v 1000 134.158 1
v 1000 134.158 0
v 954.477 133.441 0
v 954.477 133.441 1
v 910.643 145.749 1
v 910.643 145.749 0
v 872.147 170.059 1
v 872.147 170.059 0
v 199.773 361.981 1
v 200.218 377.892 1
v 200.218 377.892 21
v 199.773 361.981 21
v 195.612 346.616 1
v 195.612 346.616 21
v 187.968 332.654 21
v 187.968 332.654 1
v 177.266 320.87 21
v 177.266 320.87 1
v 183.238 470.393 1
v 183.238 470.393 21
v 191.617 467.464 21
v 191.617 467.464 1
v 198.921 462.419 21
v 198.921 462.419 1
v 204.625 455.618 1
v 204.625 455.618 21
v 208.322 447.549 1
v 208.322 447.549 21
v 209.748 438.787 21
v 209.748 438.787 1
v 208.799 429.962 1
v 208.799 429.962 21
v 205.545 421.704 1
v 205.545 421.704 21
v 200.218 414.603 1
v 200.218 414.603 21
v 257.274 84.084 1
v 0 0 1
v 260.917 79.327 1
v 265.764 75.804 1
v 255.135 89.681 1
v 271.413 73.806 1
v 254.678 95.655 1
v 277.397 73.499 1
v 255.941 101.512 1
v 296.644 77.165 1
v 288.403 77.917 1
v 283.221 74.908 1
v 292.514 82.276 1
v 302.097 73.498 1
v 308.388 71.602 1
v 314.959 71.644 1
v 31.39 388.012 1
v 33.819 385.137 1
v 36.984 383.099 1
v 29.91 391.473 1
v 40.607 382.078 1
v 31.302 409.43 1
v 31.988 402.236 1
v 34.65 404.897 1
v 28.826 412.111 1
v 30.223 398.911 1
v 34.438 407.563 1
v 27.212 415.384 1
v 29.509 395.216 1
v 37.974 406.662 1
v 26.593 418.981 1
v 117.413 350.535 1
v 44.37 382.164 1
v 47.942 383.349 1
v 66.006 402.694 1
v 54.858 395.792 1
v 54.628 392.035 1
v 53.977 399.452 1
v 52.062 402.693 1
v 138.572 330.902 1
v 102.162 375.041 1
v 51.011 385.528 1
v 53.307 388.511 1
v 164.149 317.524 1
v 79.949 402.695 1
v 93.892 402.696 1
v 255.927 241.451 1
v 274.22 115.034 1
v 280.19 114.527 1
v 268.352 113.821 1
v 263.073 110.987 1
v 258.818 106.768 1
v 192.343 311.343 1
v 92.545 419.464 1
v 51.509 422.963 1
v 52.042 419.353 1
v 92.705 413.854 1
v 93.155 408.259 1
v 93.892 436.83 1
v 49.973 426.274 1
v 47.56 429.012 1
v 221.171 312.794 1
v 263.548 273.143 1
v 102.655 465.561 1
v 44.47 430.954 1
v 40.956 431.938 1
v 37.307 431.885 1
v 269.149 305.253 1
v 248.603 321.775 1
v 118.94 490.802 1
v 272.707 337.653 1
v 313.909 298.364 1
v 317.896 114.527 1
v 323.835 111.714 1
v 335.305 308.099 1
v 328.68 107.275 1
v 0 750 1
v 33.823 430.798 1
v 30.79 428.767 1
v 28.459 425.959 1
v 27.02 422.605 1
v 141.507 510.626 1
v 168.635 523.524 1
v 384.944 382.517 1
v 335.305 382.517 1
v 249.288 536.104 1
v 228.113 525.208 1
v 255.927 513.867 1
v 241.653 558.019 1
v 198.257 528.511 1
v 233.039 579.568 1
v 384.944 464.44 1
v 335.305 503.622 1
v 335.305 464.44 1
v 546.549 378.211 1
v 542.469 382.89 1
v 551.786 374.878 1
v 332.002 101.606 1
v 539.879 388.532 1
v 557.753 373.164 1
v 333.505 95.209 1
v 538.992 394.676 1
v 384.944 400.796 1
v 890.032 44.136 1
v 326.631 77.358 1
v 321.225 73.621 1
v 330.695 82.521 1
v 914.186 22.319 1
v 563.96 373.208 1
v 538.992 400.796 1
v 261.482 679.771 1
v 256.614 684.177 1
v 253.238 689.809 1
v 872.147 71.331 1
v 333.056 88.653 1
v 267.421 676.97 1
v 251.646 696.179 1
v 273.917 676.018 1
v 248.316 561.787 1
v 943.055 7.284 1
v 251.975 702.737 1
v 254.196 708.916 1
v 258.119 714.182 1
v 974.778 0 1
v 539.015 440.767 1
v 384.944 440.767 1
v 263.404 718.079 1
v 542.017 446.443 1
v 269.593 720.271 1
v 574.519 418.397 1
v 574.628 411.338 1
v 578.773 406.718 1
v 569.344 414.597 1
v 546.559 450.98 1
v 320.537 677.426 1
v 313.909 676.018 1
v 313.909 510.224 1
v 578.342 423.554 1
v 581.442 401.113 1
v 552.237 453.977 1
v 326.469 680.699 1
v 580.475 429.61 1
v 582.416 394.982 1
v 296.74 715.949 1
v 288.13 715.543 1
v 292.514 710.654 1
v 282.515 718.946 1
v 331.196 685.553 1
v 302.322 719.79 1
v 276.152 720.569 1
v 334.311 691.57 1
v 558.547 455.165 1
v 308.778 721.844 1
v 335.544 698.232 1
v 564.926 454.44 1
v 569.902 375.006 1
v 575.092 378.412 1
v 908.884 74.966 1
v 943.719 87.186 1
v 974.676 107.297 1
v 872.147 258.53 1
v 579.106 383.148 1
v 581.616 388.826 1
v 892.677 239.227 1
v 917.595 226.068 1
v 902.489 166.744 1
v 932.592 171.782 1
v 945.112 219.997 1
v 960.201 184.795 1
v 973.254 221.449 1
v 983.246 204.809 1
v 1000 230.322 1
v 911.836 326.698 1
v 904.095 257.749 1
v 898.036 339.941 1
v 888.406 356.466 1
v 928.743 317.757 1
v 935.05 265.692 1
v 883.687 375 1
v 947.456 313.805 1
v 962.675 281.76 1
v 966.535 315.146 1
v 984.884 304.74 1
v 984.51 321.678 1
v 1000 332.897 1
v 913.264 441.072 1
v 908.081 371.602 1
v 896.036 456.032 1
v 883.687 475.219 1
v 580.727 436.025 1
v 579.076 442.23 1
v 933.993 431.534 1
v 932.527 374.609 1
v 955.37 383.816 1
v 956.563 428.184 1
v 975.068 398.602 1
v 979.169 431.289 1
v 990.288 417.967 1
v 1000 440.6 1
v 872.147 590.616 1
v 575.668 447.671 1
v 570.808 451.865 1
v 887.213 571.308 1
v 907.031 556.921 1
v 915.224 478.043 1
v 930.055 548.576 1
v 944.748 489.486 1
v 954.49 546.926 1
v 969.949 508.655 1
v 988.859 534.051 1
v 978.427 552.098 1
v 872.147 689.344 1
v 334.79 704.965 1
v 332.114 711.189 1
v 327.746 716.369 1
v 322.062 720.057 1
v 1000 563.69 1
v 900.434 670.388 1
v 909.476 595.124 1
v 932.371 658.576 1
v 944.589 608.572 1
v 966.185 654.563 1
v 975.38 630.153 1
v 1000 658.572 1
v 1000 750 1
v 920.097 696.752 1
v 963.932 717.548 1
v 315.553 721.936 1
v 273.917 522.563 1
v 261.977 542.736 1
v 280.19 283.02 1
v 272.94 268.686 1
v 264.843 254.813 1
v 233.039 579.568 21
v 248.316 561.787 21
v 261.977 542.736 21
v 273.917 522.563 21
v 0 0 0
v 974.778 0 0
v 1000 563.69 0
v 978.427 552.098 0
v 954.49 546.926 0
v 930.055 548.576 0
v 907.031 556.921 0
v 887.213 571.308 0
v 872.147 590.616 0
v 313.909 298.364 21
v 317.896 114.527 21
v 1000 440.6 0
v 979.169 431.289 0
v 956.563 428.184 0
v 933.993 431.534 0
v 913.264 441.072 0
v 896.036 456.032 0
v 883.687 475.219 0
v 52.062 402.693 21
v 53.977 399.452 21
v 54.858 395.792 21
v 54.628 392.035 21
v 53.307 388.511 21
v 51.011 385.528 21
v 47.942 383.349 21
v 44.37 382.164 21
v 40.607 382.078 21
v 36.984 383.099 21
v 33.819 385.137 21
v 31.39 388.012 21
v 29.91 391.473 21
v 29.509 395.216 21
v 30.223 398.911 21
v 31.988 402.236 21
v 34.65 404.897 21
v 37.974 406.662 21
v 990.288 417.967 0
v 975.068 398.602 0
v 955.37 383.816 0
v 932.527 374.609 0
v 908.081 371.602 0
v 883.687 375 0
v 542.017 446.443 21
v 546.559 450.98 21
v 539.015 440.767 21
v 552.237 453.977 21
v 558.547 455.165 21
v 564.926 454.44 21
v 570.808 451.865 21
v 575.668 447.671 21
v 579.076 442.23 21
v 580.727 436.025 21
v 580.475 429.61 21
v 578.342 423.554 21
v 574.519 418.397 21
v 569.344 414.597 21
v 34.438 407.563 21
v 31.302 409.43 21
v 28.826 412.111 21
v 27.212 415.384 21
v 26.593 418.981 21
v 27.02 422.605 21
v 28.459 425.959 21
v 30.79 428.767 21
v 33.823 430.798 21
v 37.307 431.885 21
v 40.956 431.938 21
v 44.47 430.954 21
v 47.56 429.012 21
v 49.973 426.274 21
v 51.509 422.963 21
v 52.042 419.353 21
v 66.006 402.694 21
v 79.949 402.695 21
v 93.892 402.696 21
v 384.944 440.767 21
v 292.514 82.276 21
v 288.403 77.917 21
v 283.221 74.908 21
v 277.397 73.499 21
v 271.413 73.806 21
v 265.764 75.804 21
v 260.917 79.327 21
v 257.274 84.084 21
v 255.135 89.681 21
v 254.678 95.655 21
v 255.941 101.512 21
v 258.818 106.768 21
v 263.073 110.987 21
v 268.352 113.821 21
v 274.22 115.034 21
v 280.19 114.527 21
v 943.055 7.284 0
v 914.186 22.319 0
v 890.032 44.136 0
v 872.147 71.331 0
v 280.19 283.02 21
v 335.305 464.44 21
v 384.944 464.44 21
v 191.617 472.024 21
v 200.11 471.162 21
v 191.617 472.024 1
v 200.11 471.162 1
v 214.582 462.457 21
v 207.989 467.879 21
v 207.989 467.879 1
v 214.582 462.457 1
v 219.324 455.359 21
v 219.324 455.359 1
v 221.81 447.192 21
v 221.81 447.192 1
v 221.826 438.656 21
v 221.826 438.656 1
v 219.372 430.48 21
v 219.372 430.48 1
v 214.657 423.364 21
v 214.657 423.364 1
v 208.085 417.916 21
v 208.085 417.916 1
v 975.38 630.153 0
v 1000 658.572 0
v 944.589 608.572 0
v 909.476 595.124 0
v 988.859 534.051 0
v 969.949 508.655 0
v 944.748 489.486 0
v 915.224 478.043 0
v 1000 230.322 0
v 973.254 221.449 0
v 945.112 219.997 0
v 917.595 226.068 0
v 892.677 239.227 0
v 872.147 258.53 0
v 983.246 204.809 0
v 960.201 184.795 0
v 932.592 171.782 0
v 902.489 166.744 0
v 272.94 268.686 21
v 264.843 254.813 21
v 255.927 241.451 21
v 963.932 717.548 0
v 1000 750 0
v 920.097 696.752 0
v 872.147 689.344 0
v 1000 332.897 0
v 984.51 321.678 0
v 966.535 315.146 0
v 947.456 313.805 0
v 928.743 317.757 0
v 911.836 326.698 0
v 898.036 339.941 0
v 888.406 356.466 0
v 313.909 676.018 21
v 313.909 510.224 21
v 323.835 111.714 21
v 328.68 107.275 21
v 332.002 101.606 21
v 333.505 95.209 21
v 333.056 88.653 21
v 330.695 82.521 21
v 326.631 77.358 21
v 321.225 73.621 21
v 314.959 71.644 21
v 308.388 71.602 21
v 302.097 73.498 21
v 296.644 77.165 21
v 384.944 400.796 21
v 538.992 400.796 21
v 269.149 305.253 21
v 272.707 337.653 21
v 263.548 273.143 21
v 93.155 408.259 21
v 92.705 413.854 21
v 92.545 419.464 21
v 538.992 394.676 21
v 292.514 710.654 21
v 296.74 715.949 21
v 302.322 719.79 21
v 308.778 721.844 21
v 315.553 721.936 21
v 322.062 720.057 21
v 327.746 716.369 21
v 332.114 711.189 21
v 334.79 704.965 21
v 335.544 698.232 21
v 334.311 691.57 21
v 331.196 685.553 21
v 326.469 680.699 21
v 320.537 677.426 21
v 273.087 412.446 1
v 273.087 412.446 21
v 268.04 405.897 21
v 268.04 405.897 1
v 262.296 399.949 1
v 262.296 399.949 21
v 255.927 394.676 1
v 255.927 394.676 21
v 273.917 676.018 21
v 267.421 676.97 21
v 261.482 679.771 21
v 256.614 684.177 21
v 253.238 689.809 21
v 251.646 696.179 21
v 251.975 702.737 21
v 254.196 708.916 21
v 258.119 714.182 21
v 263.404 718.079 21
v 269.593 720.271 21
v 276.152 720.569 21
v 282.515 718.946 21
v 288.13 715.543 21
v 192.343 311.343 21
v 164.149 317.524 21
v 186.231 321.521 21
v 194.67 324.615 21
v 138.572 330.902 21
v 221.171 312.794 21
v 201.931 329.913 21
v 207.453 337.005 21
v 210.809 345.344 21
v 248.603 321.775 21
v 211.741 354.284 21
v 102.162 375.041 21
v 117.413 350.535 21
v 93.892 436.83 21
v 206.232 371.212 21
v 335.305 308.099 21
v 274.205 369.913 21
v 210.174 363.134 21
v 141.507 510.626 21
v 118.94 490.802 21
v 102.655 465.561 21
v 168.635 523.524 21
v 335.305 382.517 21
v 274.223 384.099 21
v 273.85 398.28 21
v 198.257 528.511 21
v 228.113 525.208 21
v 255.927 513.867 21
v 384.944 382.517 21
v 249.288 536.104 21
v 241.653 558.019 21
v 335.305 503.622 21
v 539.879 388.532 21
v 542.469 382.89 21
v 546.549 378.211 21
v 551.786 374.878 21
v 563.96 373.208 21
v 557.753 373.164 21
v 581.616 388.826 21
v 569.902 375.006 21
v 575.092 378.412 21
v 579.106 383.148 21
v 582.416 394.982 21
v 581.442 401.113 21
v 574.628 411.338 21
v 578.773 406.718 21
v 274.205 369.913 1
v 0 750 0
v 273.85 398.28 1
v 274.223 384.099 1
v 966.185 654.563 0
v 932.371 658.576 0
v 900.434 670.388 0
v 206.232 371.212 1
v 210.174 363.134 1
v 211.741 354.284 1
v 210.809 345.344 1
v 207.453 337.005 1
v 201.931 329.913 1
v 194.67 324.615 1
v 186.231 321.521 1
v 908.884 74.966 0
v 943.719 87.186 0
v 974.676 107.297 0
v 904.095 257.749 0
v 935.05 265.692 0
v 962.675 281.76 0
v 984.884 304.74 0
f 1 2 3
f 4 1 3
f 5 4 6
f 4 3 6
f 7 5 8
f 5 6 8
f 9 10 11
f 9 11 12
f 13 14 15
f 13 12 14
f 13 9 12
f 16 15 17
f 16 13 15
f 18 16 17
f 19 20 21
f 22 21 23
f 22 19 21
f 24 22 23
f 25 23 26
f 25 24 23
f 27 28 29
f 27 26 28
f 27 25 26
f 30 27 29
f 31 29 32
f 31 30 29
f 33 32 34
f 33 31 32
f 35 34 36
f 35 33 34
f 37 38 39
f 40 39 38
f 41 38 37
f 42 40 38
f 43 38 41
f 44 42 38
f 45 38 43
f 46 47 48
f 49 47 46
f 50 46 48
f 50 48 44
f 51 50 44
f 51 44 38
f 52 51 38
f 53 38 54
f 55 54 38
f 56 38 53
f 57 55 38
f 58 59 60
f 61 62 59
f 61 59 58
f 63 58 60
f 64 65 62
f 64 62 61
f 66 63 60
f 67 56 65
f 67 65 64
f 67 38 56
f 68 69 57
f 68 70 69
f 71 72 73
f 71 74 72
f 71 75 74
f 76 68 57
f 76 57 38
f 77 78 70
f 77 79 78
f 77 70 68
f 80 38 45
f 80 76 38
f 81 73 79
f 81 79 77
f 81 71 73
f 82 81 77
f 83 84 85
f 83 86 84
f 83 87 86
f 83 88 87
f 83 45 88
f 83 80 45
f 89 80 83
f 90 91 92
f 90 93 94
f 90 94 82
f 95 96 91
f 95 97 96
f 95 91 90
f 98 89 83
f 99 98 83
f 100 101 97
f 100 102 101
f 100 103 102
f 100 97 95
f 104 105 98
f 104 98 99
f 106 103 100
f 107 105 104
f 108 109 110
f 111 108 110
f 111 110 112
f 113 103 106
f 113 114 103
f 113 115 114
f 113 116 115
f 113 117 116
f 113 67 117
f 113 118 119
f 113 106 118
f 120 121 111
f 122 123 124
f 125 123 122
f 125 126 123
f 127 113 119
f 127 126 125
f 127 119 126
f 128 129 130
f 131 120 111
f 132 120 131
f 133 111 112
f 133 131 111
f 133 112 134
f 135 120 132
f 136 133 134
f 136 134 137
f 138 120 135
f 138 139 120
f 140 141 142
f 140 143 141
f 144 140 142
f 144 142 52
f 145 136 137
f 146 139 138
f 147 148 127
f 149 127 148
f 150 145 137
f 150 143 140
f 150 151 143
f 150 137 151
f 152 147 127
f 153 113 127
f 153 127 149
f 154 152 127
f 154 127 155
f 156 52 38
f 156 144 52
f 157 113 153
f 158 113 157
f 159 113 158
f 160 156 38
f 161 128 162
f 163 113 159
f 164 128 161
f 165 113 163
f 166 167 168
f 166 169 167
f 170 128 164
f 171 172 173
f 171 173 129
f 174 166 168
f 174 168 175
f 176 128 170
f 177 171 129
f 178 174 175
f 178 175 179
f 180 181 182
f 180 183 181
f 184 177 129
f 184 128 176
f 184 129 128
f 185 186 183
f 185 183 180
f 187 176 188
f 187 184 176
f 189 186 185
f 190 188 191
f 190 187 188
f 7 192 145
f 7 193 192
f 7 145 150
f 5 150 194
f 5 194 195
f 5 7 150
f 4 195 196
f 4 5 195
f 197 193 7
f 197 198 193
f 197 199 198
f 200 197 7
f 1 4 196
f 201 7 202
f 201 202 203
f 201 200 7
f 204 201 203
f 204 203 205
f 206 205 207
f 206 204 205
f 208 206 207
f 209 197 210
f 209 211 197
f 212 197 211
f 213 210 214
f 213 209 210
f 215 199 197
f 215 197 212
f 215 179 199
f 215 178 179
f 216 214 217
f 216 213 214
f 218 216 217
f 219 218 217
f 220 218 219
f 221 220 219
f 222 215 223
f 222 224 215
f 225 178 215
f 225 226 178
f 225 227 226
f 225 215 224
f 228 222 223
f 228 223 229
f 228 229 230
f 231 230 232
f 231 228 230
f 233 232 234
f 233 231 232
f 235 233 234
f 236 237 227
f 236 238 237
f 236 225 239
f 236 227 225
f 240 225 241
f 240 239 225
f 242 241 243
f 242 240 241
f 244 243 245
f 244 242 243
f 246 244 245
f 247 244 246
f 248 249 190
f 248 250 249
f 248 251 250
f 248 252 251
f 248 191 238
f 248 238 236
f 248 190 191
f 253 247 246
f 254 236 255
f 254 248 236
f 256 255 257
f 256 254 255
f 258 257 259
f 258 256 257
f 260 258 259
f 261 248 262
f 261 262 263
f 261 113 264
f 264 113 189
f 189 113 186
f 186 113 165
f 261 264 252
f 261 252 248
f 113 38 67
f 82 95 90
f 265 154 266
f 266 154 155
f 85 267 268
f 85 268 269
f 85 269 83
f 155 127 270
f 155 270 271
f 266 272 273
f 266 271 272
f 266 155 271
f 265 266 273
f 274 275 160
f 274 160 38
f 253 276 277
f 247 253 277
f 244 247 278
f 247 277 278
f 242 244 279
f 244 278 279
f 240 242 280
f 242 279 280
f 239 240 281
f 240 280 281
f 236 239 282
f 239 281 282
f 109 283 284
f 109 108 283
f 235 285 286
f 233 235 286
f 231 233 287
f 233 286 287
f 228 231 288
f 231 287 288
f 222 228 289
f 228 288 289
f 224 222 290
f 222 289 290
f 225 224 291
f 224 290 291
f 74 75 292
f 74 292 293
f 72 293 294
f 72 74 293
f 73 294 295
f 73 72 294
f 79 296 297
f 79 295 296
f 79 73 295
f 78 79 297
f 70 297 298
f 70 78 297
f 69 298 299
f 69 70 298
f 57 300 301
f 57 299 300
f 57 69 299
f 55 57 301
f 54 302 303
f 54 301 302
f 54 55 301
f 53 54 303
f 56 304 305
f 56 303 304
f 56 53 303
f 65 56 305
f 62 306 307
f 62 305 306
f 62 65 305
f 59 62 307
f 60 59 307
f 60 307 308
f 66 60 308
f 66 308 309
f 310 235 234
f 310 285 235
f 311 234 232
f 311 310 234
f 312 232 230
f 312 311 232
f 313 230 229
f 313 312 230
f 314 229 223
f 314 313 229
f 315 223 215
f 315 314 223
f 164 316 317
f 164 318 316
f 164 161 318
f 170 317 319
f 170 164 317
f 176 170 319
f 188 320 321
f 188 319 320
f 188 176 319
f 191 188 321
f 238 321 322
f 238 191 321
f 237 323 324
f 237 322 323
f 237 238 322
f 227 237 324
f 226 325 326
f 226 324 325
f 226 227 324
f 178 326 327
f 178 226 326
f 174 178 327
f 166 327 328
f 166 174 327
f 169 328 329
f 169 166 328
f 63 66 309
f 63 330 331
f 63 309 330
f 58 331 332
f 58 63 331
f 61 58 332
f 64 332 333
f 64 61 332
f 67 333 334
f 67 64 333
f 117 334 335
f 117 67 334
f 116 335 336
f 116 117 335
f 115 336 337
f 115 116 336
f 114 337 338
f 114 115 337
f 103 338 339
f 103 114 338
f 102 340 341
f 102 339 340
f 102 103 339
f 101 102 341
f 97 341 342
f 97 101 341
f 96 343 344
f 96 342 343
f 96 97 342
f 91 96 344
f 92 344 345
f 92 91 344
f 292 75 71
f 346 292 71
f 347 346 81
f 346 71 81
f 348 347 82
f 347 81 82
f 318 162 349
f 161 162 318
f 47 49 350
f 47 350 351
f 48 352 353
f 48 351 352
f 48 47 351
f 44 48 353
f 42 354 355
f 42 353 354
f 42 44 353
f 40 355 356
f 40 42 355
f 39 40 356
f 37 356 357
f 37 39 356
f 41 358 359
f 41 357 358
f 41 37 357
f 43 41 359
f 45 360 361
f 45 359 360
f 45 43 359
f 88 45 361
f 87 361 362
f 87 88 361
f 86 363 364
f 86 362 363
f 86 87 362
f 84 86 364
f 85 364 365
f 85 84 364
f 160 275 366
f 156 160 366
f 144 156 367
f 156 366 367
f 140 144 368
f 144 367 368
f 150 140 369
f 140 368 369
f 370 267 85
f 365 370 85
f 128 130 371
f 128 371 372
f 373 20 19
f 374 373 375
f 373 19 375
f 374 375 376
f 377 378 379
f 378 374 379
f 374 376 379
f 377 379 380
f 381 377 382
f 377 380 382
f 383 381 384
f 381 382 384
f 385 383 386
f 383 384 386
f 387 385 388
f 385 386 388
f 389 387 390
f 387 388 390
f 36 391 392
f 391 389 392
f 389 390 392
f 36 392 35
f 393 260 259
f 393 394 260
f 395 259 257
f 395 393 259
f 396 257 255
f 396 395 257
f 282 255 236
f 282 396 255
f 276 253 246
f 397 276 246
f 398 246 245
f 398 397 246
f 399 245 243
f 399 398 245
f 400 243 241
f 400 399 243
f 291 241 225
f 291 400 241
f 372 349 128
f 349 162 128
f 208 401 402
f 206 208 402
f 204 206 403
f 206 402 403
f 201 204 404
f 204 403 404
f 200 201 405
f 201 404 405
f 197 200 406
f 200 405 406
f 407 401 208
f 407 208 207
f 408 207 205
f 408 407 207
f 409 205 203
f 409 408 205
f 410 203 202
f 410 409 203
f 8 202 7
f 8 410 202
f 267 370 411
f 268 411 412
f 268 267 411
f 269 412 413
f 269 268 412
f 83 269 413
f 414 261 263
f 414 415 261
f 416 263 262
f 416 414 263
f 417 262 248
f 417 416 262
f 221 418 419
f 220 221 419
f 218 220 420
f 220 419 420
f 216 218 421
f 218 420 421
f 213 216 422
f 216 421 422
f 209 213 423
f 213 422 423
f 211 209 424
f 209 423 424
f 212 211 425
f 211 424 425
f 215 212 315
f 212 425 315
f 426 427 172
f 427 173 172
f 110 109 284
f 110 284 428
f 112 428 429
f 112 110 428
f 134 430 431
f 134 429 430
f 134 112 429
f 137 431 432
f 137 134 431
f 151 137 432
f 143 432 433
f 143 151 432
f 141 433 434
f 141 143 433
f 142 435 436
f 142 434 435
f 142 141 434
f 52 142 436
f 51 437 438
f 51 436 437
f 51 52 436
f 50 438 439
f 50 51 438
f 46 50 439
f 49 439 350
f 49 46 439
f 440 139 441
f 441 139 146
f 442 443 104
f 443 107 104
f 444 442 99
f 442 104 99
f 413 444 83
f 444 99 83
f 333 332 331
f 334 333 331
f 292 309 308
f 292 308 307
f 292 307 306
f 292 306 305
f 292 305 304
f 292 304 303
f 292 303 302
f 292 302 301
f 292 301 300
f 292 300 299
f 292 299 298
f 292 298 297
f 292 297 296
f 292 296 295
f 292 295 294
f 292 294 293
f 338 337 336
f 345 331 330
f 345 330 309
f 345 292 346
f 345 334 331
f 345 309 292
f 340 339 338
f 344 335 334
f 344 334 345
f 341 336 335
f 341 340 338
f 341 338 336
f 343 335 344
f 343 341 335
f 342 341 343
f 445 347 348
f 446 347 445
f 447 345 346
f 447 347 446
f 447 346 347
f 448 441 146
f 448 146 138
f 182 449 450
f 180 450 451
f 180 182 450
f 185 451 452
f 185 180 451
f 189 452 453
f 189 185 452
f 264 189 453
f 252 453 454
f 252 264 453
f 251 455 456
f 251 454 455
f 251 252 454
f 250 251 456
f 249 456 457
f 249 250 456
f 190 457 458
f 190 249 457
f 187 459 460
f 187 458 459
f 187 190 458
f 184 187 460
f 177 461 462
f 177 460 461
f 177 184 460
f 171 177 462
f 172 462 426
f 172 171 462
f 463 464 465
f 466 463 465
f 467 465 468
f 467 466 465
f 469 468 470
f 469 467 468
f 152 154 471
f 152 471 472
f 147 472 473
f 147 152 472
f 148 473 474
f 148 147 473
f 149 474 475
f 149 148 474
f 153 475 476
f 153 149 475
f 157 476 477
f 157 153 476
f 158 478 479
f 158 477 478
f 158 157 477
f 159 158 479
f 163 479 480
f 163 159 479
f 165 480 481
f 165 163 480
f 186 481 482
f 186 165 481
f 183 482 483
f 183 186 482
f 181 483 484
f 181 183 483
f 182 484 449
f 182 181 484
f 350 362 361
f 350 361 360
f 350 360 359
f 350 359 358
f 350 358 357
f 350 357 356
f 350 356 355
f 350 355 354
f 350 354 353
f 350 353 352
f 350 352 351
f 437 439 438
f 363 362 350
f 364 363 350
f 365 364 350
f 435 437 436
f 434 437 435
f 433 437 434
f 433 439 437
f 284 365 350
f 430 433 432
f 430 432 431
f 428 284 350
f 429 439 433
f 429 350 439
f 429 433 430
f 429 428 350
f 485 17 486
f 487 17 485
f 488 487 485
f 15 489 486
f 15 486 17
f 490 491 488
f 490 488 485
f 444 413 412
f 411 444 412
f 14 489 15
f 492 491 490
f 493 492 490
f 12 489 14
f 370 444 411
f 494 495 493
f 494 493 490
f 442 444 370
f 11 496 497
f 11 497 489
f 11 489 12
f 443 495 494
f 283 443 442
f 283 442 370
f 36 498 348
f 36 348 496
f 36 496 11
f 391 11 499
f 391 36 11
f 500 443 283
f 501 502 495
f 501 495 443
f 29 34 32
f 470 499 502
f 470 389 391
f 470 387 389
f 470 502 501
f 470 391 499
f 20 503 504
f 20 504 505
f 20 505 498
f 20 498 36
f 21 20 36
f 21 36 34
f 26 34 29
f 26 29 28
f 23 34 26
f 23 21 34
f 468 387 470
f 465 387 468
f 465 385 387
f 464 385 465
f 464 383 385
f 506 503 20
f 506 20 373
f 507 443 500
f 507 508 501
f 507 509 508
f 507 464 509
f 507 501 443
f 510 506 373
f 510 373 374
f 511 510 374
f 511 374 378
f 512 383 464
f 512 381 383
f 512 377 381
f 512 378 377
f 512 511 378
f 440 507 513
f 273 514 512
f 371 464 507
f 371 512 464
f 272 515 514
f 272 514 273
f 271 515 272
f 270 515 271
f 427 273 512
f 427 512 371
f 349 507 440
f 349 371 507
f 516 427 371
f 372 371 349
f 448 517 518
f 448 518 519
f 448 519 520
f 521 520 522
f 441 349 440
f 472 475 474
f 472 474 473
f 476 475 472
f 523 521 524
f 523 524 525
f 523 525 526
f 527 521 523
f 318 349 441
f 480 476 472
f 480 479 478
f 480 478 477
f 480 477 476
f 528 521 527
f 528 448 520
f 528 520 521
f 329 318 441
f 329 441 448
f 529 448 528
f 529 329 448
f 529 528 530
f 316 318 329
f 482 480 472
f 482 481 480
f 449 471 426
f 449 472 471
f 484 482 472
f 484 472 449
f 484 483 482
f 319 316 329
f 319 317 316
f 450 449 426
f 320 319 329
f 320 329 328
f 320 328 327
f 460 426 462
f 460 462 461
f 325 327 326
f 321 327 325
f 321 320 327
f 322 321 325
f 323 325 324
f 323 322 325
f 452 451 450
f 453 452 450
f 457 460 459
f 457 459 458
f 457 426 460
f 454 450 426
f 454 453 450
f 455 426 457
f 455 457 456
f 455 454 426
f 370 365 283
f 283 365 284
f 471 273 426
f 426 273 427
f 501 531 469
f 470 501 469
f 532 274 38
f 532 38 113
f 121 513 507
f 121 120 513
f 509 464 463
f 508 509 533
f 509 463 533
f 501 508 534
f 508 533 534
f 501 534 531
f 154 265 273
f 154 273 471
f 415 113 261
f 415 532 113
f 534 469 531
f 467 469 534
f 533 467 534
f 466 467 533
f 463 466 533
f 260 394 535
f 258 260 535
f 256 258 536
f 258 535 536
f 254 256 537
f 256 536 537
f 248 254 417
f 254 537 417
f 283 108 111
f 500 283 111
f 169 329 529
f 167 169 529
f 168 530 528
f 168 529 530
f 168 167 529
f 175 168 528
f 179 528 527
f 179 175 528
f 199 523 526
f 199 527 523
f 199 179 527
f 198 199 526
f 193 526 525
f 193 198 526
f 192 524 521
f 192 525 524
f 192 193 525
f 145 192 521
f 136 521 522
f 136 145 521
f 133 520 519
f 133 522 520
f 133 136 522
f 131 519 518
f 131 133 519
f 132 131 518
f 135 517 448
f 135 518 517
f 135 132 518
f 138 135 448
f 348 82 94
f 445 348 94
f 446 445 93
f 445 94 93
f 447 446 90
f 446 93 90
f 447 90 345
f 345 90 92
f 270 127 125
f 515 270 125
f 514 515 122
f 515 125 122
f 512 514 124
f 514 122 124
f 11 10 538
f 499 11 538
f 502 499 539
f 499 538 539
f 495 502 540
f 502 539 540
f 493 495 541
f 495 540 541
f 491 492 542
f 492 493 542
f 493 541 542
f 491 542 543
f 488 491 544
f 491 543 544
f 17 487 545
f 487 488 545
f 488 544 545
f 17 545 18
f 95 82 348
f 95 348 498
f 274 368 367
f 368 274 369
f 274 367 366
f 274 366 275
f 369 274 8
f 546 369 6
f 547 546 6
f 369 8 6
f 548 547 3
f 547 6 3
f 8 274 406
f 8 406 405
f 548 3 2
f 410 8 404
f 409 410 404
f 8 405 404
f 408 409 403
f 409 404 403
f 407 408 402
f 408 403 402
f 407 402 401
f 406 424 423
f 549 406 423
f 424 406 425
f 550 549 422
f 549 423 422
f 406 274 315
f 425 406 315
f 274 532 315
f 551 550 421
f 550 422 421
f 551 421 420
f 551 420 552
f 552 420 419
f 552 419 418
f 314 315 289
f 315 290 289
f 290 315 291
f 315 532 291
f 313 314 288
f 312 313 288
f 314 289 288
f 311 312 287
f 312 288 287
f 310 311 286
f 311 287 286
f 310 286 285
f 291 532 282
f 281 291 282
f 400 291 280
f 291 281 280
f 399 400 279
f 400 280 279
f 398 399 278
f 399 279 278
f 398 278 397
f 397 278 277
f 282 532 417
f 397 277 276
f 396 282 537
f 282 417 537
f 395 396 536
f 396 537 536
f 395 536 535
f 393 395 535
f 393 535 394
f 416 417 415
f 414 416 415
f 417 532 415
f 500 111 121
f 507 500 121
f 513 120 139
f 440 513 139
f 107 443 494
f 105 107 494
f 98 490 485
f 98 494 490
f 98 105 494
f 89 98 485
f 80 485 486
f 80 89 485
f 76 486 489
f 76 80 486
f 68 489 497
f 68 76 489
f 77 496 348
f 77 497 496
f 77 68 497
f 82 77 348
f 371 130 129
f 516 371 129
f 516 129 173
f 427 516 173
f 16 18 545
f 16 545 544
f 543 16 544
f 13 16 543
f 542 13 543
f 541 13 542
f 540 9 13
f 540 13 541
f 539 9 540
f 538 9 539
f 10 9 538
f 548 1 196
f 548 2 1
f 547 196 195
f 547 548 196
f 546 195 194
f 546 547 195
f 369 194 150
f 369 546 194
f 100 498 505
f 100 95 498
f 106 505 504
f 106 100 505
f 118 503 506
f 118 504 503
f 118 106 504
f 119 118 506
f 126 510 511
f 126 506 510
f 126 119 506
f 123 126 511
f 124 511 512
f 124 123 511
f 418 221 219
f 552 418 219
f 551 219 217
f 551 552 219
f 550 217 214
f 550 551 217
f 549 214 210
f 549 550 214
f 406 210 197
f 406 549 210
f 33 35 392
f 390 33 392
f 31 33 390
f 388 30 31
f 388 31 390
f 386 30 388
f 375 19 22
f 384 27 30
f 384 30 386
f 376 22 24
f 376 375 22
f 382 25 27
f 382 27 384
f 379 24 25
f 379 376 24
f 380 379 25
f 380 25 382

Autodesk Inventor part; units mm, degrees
ref_plane "YZ Plane" through (0, 0, 0) normal (1, 0, 0) x (0, 1, 0)
ref_plane "XZ Plane" through (0, 0, 0) normal (0, 1, 0) x (-1, 0, 0)
ref_plane "XY Plane" through (0, 0, 0) normal (0, 0, 1) x (1, 0, 0)
sketch "Sketch1" plane through (0, 0, 0) normal (0, 0, 1) x (1, 0, 0)
  point P0 (0, 0)
sketch "Sketch2" plane through (0, 0, 0) normal (0, 0, 1) x (1, 0, 0)
  line L0 (0, 0) -> (0, 750)
  line L1 (0, 750) -> (1000, 750)
  line L2 (1000, 0) -> (0, 0)
  arc A0 (872.1472, 689.3444) -> (1000, 750) centre (870.7317, 857.403) ccw
  arc A1 (872.1472, 689.3444) -> (1000, 658.5719) centre (966.1931, 799.0982) ccw
  arc A2 (872.1472, 590.6161) -> (1000, 658.5719) centre (872.5455, 744.1165) ccw
  arc A3 (872.1472, 590.6161) -> (1000, 563.6902) centre (948.1226, 634.3656) ccw
  arc A4 (883.6869, 475.2194) -> (1000, 563.6902) centre (889.4567, 588.3279) ccw
  arc A5 (883.6869, 475.2194) -> (1000, 440.6004) centre (957.0015, 508.838) ccw
  arc A6 (883.6869, 375) -> (1000, 440.6004) centre (908.84, 466.3171) ccw
  arc A7 (883.6869, 375) -> (1000, 332.8968) centre (952.2072, 382.5789) ccw
  arc A8 (872.1472, 258.53) -> (1000, 332.8968) centre (890.9368, 373.3135) ccw
  arc A9 (872.1472, 258.53) -> (1000, 230.3219) centre (953.8095, 324.8138) ccw
  arc A10 (872.1472, 170.0592) -> (1000, 230.3219) centre (899.3125, 278.1825) ccw
  arc A11 (872.1472, 170.0592) -> (1000, 134.158) centre (974.7778, 289.9436) ccw
  arc A12 (872.1472, 71.3309) -> (1000, 134.158) centre (875.3594, 226.2976) ccw
  arc A13 (872.1472, 71.3309) -> (1000, 0) centre (987.3889, 127.6425) ccw
  point P0 (974.7778, 0)
  dimension "d0" = 1000
  dimension "d1" = 750
extrude "Extrusion1" add sketch "Sketch2" along normal blind 1 contours L0 L1 A0 A1 A2 A3 A4 A5 A6 A7 A8 A9 A10 A11 A12 A13 L2
sketch "Sketch3" plane through (0, 0, 1) normal (0, 0, 1) x (1, 0, 0)
  arc A0 (255.9272, 241.4511) -> (233.0393, 579.5682) centre (37.9767, 396.5307) ccw
  arc A1 (255.9272, 241.4511) -> (233.0393, 579.5682) centre (-240.8103, 377.659) ccw
  line L0 (271.4534, 431.3865) -> (273.9174, 432.6014)
  line L1 (280.1904, 283.0201) -> (335.3049, 308.0994)
  line L2 (335.3049, 308.0994) -> (335.3049, 503.6219)
  line L3 (335.3049, 503.6219) -> (273.9174, 522.5629)
  line L4 (304.6112, 375.1252) -> (335.3049, 375.1252)
  line L5 (304.8582, 414.5966) -> (335.3049, 414.5966)
  line L6 (300.4881, 447.9105) -> (335.3049, 454.725)
  line L7 (300.4881, 345.151) -> (335.3049, 345.151)
  line L8 (335.3049, 308.0994) -> (290.4287, 308.0994)
  line L9 (335.3049, 478.7687) -> (292.5136, 478.7687)
  line L10 (398.8359, 328.3286) -> (401.8332, 328.3268)
  line L11 (401.8332, 328.3678) -> (401.8332, 328.3268)
  line L12 (335.3049, 464.4404) -> (384.9435, 464.4404)
  line L13 (384.9435, 464.4404) -> (384.9435, 464.4404)
  line L14 (384.9435, 382.5166) -> (335.3049, 382.5166)
  line L15 (384.9435, 382.5166) -> (384.9435, 464.4404)
  line L16 (273.9174, 522.5629) -> (273.9174, 676.0175)
  line L17 (313.9093, 510.2235) -> (313.9093, 676.0175)
  line L18 (280.1904, 283.0201) -> (280.1904, 114.5271)
  line L19 (313.9093, 298.3636) -> (317.8965, 114.5271)
  line L20 (384.9435, 440.7673) -> (539.0153, 440.7673)
  line L21 (384.9435, 400.7959) -> (538.9917, 400.7959)
  line L22 (538.9917, 400.7959) -> (538.9917, 394.6756)
  arc A2 (292.5136, 710.6536) -> (273.9174, 676.0175) centre (273.8735, 698.3513) ccw
  arc A3 (313.9093, 676.0175) -> (292.5136, 710.6536) centre (312.4744, 699.0575) ccw
  arc A4 (280.1904, 114.5271) -> (292.5136, 82.2759) centre (275.4611, 94.2401) ccw
  arc A5 (292.5136, 82.2759) -> (317.8965, 114.5271) centre (311.5333, 93.421) ccw
  arc A6 (569.3438, 414.5966) -> (539.0153, 440.7673) centre (559.332, 433.653) ccw
  arc A7 (538.9917, 394.6756) -> (569.3438, 414.5966) centre (560.7051, 394.6756) ccw
  arc A8 (119.3978, 413.2034) -> (119.4326, 412.4736) centre (255.9272, 419.3527) ccw
  arc A9 (408.8801, 400.7959) -> (409.9282, 414.5966) centre (255.9272, 419.3527) ccw
  arc A10 (239.4049, 572.5387) -> (236.132, 572.1502) centre (255.9272, 419.3527) ccw
  arc A11 (271.4961, 266.0669) -> (273.9174, 266.3322) centre (255.9272, 419.3527) ccw
  arc A12 (255.9272, 513.8669) -> (272.7073, 337.6534) centre (201.3368, 419.7628) ccw
  arc A13 (177.2662, 320.8702) -> (200.2183, 377.8924) centre (133.0133, 371.8129) ccw
  arc A14 (177.2662, 320.8702) -> (200.2183, 377.8924) centre (179.4288, 353.1301) ccw
  arc A15 (200.2183, 414.6034) -> (183.2381, 470.3927) centre (176.5796, 437.8874) ccw
  arc A16 (200.2183, 414.6034) -> (183.2381, 470.3927) centre (192.946, 442.8687) ccw
  line L23 (274.205, 369.9133) -> (255.9272, 394.6756)
  arc A17 (255.9272, 394.6756) -> (273.0872, 412.4459) centre (211.8011, 454.4566) ccw
  line L24 (92.5453, 419.464) -> (52.0419, 419.3528)
  line L25 (52.0419, 419.3528) -> (52.0586, 413.2472)
  line L26 (93.8919, 402.6957) -> (93.8919, 436.8299)
  arc A18 (93.8919, 402.6957) -> (52.0624, 402.6927) centre (93.8919, -288422.4778) ccw
  line L27 (52.0624, 402.6927) -> (52.0624, 402.6927)
  arc A19 (37.9745, 406.6619) -> (52.0624, 402.6927) centre (42.2022, 394.6819) ccw
  arc A20 (52.0419, 419.3528) -> (37.9745, 406.6619) centre (39.3152, 419.3178) ccw
  point P0 (0, 0)
extrude "Extrusion2" add sketch "Sketch3" along normal blind 20 contours A1 A10 A0 | A12 L26 A1 A17 L23 | A0 L8 L1 | L1 L19 A5 A4 L18 | A18 A19 A20 L24 A12 | A0 L7 L2 L8 | A0 L4 L2 L7 | A0 L5 L2 L4 | A1 A0 A10 | A0 L6 L2 L5 | A0 L9 L2 L6 | L2 L12 L15 L14 | L3 L2 L9 A0 | L16 A2 A3 L17 L3 | L15 L20 A6 A7 L22 L21
properties part number "flag of ship pirate"
